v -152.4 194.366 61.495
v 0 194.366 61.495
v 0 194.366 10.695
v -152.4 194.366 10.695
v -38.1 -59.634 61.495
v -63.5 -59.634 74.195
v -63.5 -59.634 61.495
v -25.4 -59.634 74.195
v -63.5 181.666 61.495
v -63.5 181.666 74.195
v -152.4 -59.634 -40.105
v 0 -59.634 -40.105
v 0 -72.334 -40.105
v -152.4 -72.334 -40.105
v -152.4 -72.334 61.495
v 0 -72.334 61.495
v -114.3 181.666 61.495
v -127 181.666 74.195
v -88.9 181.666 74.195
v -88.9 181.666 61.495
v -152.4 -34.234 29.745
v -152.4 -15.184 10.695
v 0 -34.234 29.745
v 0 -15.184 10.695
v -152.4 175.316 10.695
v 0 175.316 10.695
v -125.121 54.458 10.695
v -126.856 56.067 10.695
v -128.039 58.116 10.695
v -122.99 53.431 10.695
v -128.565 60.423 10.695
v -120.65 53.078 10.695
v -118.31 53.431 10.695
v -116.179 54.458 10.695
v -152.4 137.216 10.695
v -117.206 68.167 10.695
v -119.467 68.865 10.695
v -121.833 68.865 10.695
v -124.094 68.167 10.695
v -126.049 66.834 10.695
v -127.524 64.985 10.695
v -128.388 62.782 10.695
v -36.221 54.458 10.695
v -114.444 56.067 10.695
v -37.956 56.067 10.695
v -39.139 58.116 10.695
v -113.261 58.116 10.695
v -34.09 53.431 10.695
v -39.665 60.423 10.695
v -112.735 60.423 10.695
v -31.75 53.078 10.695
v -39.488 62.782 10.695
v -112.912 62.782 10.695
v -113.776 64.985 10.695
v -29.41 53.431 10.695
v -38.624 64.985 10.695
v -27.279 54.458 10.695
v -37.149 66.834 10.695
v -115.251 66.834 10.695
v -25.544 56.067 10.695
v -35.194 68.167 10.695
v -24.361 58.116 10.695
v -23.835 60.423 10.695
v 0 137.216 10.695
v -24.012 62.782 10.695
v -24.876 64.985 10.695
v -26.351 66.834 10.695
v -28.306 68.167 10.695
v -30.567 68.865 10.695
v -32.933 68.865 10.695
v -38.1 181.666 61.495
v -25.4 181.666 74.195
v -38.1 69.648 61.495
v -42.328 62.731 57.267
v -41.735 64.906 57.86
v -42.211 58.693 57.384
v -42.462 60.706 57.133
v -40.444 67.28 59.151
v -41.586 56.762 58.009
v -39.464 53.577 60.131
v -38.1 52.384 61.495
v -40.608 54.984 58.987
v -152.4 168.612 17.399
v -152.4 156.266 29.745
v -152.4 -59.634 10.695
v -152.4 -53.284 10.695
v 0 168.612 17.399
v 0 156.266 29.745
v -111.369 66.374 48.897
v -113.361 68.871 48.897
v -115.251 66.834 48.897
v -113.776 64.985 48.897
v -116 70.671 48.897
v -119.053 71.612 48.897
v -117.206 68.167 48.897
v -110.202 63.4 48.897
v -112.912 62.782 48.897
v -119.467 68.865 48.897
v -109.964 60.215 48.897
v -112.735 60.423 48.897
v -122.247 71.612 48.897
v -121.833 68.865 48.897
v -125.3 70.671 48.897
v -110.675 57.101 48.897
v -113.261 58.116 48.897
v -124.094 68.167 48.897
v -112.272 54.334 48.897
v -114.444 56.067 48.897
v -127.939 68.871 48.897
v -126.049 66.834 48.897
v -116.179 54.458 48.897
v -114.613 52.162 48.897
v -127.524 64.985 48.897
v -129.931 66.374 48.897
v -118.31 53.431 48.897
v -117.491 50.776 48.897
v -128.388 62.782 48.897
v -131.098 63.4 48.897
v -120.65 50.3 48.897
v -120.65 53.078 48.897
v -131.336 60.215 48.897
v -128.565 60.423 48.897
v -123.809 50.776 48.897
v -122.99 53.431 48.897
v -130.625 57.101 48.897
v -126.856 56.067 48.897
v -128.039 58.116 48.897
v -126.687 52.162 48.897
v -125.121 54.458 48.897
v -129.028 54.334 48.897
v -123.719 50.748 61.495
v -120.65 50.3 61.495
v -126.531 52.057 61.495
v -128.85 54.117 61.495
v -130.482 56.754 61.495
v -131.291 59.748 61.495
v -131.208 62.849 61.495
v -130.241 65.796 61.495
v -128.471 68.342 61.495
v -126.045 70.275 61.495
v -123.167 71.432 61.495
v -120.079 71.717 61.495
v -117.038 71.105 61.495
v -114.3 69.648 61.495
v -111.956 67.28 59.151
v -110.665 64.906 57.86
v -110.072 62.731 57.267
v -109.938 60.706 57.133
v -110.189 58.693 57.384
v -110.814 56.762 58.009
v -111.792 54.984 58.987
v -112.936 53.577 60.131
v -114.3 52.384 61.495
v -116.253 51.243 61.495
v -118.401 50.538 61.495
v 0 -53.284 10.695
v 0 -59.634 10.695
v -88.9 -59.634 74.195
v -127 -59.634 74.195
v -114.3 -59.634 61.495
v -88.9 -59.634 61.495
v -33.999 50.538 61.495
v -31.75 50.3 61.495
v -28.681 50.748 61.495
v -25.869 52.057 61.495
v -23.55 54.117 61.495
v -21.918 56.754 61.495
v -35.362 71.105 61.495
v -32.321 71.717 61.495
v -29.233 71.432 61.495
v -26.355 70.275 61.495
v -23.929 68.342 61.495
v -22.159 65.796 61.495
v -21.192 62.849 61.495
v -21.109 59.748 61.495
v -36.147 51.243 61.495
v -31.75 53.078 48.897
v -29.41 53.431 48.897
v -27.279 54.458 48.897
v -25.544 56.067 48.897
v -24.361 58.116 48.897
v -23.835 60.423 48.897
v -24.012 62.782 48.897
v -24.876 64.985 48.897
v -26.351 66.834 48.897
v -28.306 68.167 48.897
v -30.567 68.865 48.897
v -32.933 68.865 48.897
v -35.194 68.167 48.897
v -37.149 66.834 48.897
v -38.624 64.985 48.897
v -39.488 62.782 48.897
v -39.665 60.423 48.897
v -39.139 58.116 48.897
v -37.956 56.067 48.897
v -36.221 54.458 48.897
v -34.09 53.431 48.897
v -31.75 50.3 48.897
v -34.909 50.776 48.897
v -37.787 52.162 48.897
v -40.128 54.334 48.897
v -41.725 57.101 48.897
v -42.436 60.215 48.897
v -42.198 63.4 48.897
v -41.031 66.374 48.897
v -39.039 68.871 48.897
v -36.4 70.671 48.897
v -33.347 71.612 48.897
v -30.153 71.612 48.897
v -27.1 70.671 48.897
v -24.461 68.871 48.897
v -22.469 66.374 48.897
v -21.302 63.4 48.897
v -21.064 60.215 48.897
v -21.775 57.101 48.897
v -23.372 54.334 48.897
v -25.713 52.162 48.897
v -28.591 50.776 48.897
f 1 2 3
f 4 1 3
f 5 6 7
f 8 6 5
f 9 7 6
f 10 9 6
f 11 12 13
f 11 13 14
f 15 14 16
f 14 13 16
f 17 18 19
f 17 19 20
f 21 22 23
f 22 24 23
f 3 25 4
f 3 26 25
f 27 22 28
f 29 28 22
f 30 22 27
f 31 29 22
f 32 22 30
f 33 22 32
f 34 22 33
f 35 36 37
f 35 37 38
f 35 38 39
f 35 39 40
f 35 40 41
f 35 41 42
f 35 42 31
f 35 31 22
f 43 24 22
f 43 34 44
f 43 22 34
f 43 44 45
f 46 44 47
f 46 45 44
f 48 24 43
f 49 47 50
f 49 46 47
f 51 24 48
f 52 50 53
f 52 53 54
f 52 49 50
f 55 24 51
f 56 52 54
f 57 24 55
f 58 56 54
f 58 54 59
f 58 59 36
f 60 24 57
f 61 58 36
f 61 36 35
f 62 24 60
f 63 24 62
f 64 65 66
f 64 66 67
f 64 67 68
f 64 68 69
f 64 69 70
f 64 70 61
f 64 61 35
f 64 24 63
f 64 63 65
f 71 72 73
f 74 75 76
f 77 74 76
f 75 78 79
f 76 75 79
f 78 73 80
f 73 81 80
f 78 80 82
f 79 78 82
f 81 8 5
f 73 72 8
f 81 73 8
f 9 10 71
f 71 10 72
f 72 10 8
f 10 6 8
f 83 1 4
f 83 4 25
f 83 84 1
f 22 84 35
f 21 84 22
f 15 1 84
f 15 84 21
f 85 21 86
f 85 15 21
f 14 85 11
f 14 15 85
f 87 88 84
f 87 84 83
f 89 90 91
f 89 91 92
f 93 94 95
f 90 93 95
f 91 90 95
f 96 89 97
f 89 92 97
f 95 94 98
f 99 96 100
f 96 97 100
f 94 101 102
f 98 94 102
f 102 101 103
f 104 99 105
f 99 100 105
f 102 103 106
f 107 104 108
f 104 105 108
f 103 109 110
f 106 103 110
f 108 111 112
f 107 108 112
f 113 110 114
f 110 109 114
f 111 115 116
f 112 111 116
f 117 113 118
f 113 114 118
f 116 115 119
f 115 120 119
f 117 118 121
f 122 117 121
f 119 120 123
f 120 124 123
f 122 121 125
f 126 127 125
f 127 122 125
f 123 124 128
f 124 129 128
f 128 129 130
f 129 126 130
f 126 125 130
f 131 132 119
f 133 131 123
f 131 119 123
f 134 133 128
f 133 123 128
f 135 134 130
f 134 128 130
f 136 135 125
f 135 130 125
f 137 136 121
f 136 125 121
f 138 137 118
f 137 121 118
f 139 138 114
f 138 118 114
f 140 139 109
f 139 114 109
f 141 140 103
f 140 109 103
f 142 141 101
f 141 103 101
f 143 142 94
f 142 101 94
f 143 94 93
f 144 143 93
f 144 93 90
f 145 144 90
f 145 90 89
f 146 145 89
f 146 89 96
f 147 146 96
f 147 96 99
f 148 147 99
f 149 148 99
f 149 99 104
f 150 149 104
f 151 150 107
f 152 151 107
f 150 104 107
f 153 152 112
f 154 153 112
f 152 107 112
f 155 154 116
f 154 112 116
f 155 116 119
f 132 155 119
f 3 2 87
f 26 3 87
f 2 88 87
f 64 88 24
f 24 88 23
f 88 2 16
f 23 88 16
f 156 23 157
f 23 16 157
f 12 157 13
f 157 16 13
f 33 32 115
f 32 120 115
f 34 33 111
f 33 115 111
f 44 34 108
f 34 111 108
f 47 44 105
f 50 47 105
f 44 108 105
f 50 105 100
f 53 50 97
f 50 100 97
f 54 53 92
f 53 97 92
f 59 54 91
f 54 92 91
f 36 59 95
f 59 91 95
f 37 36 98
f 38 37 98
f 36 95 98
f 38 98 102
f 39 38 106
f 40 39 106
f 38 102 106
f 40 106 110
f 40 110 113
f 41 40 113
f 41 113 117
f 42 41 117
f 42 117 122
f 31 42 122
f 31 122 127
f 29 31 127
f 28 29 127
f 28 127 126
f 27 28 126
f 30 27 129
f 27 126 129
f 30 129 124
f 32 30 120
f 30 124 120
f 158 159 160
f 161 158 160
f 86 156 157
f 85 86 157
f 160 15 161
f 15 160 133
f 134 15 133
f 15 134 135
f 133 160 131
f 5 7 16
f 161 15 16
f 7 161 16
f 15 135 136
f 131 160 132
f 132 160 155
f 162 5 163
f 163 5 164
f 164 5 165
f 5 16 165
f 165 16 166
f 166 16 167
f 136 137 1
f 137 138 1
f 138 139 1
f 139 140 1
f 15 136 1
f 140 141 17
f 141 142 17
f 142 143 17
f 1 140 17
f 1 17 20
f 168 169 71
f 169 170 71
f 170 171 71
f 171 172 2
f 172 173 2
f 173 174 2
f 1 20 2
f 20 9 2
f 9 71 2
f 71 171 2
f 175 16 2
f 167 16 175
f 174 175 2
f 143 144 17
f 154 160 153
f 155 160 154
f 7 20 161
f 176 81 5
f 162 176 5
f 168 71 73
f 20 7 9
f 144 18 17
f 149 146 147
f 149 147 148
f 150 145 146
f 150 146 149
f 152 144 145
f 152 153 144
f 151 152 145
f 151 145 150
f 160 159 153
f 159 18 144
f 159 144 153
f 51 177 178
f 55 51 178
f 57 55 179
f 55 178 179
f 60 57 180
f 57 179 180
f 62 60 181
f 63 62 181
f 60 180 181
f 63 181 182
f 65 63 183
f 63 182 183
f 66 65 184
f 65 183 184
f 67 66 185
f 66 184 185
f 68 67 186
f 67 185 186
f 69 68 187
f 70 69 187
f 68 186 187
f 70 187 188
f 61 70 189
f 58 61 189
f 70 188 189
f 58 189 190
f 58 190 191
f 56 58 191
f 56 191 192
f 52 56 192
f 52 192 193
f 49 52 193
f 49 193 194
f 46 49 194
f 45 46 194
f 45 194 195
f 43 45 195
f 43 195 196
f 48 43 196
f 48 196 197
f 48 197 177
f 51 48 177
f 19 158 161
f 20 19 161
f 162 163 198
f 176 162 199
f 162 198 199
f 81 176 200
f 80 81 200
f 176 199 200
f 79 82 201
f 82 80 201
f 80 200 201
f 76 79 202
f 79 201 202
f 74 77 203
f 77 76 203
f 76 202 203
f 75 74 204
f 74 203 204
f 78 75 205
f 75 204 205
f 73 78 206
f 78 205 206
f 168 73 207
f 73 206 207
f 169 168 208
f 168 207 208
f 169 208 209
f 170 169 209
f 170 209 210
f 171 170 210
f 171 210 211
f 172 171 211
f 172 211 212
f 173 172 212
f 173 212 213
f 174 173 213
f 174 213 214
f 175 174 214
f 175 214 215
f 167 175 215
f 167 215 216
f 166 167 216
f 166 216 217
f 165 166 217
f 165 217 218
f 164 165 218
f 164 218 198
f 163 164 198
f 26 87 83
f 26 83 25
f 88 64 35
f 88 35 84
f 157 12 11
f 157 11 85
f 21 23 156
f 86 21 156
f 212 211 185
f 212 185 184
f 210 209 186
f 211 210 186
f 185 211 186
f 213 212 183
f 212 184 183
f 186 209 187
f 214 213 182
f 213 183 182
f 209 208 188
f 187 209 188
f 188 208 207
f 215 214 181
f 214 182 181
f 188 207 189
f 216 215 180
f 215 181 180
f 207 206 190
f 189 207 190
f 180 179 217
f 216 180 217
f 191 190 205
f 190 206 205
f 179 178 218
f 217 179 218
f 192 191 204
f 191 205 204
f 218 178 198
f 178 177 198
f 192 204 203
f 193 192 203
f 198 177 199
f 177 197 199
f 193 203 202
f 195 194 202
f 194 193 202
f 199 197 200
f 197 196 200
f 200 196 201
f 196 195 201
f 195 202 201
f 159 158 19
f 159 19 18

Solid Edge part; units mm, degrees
sketch "Sketch1" plane through (0, 0, 0) normal (1, 0, 0) x (0, 1, 0)
  line L0 (-59.6342, 10.695) -> (-59.6342, 48.795)
  line L1 (-59.6342, 48.795) -> (-59.6342, 61.495)
  line L2 (-59.6342, 61.495) -> (181.6658, 61.495)
  line L3 (181.6658, 61.495) -> (181.6658, 48.795)
  line L4 (181.6658, 10.695) -> (181.6658, 48.795)
  line L5 (175.3158, 10.695) -> (181.6658, 10.695)
  line L6 (168.6119, 17.3988) -> (175.3158, 10.695)
  line L7 (156.2658, 29.745) -> (168.6119, 17.3988)
  line L8 (137.2158, 10.695) -> (156.2658, 29.745)
  line L9 (-15.1842, 10.695) -> (137.2158, 10.695)
  line L10 (-15.1842, 10.695) -> (-34.2342, 29.745)
  line L11 (-34.2342, 29.745) -> (-53.2842, 10.695)
  line L12 (-53.2842, 10.695) -> (-59.6342, 10.695)
extrude "Protrusion1" add sketch "Sketch1" against normal blind 152.4
sketch "Sketch2" plane through (-76.2, -59.6342, 36.095) normal (0, -1, 0) x (1, 0, 0)
  line L0 (76.2, -76.2) -> (-76.2, -76.2)
  line L1 (-76.2, -76.2) -> (-76.2, 25.4)
  line L2 (-76.2, 25.4) -> (76.2, 25.4)
  line L3 (76.2, 25.4) -> (76.2, -76.2)
extrude "ExtrudedProtrusion_2" add sketch "Sketch2" along normal blind 12.7
sketch "Sketch3" plane through (-76.2, 181.6658, 36.095) normal (0, 1, 0) x (-1, 0, 0)
  line L0 (-76.2, 25.4) -> (76.2, 25.4)
  line L1 (76.2, 25.4) -> (76.2, -25.4)
  line L2 (76.2, -25.4) -> (-76.2, -25.4)
  line L3 (-76.2, -25.4) -> (-76.2, 25.4)
extrude "ExtrudedProtrusion_3" add sketch "Sketch3" along normal blind 12.7
hole "Hole_1" at (-120.65, 61.0158, 61.495) direction (0, 0, -1) diameter 15.875 end up to next counterbore diameter 21.4325 counterbore depth 12.5984
hole "Hole1" at (-31.75, 61.0158, 61.495) direction (0, 0, -1) diameter 15.875 end up to next counterbore diameter 21.4325 counterbore depth 12.5984
sketch "Sketch4" plane through (-76.2, -59.6342, 36.095) normal (0, -1, 0) x (1, 0, 0)
  line L0 (-50.8, 38.1) -> (-38.1, 25.4)
  line L1 (-12.7, 38.1) -> (-50.8, 38.1)
  line L2 (-12.7, 38.1) -> (-12.7, 25.4)
  line L3 (-12.7, 25.4) -> (12.7, 25.4)
  line L4 (12.7, 25.4) -> (12.7, 38.1)
  line L5 (12.7, 38.1) -> (50.8, 38.1)
  line L6 (50.8, 38.1) -> (38.1, 25.4)
extrude "ExtrudedProtrusion_4" add sketch "Sketch4" against normal blind 241.3 material side at (-120.6146, -59.6342, 67.8804)
